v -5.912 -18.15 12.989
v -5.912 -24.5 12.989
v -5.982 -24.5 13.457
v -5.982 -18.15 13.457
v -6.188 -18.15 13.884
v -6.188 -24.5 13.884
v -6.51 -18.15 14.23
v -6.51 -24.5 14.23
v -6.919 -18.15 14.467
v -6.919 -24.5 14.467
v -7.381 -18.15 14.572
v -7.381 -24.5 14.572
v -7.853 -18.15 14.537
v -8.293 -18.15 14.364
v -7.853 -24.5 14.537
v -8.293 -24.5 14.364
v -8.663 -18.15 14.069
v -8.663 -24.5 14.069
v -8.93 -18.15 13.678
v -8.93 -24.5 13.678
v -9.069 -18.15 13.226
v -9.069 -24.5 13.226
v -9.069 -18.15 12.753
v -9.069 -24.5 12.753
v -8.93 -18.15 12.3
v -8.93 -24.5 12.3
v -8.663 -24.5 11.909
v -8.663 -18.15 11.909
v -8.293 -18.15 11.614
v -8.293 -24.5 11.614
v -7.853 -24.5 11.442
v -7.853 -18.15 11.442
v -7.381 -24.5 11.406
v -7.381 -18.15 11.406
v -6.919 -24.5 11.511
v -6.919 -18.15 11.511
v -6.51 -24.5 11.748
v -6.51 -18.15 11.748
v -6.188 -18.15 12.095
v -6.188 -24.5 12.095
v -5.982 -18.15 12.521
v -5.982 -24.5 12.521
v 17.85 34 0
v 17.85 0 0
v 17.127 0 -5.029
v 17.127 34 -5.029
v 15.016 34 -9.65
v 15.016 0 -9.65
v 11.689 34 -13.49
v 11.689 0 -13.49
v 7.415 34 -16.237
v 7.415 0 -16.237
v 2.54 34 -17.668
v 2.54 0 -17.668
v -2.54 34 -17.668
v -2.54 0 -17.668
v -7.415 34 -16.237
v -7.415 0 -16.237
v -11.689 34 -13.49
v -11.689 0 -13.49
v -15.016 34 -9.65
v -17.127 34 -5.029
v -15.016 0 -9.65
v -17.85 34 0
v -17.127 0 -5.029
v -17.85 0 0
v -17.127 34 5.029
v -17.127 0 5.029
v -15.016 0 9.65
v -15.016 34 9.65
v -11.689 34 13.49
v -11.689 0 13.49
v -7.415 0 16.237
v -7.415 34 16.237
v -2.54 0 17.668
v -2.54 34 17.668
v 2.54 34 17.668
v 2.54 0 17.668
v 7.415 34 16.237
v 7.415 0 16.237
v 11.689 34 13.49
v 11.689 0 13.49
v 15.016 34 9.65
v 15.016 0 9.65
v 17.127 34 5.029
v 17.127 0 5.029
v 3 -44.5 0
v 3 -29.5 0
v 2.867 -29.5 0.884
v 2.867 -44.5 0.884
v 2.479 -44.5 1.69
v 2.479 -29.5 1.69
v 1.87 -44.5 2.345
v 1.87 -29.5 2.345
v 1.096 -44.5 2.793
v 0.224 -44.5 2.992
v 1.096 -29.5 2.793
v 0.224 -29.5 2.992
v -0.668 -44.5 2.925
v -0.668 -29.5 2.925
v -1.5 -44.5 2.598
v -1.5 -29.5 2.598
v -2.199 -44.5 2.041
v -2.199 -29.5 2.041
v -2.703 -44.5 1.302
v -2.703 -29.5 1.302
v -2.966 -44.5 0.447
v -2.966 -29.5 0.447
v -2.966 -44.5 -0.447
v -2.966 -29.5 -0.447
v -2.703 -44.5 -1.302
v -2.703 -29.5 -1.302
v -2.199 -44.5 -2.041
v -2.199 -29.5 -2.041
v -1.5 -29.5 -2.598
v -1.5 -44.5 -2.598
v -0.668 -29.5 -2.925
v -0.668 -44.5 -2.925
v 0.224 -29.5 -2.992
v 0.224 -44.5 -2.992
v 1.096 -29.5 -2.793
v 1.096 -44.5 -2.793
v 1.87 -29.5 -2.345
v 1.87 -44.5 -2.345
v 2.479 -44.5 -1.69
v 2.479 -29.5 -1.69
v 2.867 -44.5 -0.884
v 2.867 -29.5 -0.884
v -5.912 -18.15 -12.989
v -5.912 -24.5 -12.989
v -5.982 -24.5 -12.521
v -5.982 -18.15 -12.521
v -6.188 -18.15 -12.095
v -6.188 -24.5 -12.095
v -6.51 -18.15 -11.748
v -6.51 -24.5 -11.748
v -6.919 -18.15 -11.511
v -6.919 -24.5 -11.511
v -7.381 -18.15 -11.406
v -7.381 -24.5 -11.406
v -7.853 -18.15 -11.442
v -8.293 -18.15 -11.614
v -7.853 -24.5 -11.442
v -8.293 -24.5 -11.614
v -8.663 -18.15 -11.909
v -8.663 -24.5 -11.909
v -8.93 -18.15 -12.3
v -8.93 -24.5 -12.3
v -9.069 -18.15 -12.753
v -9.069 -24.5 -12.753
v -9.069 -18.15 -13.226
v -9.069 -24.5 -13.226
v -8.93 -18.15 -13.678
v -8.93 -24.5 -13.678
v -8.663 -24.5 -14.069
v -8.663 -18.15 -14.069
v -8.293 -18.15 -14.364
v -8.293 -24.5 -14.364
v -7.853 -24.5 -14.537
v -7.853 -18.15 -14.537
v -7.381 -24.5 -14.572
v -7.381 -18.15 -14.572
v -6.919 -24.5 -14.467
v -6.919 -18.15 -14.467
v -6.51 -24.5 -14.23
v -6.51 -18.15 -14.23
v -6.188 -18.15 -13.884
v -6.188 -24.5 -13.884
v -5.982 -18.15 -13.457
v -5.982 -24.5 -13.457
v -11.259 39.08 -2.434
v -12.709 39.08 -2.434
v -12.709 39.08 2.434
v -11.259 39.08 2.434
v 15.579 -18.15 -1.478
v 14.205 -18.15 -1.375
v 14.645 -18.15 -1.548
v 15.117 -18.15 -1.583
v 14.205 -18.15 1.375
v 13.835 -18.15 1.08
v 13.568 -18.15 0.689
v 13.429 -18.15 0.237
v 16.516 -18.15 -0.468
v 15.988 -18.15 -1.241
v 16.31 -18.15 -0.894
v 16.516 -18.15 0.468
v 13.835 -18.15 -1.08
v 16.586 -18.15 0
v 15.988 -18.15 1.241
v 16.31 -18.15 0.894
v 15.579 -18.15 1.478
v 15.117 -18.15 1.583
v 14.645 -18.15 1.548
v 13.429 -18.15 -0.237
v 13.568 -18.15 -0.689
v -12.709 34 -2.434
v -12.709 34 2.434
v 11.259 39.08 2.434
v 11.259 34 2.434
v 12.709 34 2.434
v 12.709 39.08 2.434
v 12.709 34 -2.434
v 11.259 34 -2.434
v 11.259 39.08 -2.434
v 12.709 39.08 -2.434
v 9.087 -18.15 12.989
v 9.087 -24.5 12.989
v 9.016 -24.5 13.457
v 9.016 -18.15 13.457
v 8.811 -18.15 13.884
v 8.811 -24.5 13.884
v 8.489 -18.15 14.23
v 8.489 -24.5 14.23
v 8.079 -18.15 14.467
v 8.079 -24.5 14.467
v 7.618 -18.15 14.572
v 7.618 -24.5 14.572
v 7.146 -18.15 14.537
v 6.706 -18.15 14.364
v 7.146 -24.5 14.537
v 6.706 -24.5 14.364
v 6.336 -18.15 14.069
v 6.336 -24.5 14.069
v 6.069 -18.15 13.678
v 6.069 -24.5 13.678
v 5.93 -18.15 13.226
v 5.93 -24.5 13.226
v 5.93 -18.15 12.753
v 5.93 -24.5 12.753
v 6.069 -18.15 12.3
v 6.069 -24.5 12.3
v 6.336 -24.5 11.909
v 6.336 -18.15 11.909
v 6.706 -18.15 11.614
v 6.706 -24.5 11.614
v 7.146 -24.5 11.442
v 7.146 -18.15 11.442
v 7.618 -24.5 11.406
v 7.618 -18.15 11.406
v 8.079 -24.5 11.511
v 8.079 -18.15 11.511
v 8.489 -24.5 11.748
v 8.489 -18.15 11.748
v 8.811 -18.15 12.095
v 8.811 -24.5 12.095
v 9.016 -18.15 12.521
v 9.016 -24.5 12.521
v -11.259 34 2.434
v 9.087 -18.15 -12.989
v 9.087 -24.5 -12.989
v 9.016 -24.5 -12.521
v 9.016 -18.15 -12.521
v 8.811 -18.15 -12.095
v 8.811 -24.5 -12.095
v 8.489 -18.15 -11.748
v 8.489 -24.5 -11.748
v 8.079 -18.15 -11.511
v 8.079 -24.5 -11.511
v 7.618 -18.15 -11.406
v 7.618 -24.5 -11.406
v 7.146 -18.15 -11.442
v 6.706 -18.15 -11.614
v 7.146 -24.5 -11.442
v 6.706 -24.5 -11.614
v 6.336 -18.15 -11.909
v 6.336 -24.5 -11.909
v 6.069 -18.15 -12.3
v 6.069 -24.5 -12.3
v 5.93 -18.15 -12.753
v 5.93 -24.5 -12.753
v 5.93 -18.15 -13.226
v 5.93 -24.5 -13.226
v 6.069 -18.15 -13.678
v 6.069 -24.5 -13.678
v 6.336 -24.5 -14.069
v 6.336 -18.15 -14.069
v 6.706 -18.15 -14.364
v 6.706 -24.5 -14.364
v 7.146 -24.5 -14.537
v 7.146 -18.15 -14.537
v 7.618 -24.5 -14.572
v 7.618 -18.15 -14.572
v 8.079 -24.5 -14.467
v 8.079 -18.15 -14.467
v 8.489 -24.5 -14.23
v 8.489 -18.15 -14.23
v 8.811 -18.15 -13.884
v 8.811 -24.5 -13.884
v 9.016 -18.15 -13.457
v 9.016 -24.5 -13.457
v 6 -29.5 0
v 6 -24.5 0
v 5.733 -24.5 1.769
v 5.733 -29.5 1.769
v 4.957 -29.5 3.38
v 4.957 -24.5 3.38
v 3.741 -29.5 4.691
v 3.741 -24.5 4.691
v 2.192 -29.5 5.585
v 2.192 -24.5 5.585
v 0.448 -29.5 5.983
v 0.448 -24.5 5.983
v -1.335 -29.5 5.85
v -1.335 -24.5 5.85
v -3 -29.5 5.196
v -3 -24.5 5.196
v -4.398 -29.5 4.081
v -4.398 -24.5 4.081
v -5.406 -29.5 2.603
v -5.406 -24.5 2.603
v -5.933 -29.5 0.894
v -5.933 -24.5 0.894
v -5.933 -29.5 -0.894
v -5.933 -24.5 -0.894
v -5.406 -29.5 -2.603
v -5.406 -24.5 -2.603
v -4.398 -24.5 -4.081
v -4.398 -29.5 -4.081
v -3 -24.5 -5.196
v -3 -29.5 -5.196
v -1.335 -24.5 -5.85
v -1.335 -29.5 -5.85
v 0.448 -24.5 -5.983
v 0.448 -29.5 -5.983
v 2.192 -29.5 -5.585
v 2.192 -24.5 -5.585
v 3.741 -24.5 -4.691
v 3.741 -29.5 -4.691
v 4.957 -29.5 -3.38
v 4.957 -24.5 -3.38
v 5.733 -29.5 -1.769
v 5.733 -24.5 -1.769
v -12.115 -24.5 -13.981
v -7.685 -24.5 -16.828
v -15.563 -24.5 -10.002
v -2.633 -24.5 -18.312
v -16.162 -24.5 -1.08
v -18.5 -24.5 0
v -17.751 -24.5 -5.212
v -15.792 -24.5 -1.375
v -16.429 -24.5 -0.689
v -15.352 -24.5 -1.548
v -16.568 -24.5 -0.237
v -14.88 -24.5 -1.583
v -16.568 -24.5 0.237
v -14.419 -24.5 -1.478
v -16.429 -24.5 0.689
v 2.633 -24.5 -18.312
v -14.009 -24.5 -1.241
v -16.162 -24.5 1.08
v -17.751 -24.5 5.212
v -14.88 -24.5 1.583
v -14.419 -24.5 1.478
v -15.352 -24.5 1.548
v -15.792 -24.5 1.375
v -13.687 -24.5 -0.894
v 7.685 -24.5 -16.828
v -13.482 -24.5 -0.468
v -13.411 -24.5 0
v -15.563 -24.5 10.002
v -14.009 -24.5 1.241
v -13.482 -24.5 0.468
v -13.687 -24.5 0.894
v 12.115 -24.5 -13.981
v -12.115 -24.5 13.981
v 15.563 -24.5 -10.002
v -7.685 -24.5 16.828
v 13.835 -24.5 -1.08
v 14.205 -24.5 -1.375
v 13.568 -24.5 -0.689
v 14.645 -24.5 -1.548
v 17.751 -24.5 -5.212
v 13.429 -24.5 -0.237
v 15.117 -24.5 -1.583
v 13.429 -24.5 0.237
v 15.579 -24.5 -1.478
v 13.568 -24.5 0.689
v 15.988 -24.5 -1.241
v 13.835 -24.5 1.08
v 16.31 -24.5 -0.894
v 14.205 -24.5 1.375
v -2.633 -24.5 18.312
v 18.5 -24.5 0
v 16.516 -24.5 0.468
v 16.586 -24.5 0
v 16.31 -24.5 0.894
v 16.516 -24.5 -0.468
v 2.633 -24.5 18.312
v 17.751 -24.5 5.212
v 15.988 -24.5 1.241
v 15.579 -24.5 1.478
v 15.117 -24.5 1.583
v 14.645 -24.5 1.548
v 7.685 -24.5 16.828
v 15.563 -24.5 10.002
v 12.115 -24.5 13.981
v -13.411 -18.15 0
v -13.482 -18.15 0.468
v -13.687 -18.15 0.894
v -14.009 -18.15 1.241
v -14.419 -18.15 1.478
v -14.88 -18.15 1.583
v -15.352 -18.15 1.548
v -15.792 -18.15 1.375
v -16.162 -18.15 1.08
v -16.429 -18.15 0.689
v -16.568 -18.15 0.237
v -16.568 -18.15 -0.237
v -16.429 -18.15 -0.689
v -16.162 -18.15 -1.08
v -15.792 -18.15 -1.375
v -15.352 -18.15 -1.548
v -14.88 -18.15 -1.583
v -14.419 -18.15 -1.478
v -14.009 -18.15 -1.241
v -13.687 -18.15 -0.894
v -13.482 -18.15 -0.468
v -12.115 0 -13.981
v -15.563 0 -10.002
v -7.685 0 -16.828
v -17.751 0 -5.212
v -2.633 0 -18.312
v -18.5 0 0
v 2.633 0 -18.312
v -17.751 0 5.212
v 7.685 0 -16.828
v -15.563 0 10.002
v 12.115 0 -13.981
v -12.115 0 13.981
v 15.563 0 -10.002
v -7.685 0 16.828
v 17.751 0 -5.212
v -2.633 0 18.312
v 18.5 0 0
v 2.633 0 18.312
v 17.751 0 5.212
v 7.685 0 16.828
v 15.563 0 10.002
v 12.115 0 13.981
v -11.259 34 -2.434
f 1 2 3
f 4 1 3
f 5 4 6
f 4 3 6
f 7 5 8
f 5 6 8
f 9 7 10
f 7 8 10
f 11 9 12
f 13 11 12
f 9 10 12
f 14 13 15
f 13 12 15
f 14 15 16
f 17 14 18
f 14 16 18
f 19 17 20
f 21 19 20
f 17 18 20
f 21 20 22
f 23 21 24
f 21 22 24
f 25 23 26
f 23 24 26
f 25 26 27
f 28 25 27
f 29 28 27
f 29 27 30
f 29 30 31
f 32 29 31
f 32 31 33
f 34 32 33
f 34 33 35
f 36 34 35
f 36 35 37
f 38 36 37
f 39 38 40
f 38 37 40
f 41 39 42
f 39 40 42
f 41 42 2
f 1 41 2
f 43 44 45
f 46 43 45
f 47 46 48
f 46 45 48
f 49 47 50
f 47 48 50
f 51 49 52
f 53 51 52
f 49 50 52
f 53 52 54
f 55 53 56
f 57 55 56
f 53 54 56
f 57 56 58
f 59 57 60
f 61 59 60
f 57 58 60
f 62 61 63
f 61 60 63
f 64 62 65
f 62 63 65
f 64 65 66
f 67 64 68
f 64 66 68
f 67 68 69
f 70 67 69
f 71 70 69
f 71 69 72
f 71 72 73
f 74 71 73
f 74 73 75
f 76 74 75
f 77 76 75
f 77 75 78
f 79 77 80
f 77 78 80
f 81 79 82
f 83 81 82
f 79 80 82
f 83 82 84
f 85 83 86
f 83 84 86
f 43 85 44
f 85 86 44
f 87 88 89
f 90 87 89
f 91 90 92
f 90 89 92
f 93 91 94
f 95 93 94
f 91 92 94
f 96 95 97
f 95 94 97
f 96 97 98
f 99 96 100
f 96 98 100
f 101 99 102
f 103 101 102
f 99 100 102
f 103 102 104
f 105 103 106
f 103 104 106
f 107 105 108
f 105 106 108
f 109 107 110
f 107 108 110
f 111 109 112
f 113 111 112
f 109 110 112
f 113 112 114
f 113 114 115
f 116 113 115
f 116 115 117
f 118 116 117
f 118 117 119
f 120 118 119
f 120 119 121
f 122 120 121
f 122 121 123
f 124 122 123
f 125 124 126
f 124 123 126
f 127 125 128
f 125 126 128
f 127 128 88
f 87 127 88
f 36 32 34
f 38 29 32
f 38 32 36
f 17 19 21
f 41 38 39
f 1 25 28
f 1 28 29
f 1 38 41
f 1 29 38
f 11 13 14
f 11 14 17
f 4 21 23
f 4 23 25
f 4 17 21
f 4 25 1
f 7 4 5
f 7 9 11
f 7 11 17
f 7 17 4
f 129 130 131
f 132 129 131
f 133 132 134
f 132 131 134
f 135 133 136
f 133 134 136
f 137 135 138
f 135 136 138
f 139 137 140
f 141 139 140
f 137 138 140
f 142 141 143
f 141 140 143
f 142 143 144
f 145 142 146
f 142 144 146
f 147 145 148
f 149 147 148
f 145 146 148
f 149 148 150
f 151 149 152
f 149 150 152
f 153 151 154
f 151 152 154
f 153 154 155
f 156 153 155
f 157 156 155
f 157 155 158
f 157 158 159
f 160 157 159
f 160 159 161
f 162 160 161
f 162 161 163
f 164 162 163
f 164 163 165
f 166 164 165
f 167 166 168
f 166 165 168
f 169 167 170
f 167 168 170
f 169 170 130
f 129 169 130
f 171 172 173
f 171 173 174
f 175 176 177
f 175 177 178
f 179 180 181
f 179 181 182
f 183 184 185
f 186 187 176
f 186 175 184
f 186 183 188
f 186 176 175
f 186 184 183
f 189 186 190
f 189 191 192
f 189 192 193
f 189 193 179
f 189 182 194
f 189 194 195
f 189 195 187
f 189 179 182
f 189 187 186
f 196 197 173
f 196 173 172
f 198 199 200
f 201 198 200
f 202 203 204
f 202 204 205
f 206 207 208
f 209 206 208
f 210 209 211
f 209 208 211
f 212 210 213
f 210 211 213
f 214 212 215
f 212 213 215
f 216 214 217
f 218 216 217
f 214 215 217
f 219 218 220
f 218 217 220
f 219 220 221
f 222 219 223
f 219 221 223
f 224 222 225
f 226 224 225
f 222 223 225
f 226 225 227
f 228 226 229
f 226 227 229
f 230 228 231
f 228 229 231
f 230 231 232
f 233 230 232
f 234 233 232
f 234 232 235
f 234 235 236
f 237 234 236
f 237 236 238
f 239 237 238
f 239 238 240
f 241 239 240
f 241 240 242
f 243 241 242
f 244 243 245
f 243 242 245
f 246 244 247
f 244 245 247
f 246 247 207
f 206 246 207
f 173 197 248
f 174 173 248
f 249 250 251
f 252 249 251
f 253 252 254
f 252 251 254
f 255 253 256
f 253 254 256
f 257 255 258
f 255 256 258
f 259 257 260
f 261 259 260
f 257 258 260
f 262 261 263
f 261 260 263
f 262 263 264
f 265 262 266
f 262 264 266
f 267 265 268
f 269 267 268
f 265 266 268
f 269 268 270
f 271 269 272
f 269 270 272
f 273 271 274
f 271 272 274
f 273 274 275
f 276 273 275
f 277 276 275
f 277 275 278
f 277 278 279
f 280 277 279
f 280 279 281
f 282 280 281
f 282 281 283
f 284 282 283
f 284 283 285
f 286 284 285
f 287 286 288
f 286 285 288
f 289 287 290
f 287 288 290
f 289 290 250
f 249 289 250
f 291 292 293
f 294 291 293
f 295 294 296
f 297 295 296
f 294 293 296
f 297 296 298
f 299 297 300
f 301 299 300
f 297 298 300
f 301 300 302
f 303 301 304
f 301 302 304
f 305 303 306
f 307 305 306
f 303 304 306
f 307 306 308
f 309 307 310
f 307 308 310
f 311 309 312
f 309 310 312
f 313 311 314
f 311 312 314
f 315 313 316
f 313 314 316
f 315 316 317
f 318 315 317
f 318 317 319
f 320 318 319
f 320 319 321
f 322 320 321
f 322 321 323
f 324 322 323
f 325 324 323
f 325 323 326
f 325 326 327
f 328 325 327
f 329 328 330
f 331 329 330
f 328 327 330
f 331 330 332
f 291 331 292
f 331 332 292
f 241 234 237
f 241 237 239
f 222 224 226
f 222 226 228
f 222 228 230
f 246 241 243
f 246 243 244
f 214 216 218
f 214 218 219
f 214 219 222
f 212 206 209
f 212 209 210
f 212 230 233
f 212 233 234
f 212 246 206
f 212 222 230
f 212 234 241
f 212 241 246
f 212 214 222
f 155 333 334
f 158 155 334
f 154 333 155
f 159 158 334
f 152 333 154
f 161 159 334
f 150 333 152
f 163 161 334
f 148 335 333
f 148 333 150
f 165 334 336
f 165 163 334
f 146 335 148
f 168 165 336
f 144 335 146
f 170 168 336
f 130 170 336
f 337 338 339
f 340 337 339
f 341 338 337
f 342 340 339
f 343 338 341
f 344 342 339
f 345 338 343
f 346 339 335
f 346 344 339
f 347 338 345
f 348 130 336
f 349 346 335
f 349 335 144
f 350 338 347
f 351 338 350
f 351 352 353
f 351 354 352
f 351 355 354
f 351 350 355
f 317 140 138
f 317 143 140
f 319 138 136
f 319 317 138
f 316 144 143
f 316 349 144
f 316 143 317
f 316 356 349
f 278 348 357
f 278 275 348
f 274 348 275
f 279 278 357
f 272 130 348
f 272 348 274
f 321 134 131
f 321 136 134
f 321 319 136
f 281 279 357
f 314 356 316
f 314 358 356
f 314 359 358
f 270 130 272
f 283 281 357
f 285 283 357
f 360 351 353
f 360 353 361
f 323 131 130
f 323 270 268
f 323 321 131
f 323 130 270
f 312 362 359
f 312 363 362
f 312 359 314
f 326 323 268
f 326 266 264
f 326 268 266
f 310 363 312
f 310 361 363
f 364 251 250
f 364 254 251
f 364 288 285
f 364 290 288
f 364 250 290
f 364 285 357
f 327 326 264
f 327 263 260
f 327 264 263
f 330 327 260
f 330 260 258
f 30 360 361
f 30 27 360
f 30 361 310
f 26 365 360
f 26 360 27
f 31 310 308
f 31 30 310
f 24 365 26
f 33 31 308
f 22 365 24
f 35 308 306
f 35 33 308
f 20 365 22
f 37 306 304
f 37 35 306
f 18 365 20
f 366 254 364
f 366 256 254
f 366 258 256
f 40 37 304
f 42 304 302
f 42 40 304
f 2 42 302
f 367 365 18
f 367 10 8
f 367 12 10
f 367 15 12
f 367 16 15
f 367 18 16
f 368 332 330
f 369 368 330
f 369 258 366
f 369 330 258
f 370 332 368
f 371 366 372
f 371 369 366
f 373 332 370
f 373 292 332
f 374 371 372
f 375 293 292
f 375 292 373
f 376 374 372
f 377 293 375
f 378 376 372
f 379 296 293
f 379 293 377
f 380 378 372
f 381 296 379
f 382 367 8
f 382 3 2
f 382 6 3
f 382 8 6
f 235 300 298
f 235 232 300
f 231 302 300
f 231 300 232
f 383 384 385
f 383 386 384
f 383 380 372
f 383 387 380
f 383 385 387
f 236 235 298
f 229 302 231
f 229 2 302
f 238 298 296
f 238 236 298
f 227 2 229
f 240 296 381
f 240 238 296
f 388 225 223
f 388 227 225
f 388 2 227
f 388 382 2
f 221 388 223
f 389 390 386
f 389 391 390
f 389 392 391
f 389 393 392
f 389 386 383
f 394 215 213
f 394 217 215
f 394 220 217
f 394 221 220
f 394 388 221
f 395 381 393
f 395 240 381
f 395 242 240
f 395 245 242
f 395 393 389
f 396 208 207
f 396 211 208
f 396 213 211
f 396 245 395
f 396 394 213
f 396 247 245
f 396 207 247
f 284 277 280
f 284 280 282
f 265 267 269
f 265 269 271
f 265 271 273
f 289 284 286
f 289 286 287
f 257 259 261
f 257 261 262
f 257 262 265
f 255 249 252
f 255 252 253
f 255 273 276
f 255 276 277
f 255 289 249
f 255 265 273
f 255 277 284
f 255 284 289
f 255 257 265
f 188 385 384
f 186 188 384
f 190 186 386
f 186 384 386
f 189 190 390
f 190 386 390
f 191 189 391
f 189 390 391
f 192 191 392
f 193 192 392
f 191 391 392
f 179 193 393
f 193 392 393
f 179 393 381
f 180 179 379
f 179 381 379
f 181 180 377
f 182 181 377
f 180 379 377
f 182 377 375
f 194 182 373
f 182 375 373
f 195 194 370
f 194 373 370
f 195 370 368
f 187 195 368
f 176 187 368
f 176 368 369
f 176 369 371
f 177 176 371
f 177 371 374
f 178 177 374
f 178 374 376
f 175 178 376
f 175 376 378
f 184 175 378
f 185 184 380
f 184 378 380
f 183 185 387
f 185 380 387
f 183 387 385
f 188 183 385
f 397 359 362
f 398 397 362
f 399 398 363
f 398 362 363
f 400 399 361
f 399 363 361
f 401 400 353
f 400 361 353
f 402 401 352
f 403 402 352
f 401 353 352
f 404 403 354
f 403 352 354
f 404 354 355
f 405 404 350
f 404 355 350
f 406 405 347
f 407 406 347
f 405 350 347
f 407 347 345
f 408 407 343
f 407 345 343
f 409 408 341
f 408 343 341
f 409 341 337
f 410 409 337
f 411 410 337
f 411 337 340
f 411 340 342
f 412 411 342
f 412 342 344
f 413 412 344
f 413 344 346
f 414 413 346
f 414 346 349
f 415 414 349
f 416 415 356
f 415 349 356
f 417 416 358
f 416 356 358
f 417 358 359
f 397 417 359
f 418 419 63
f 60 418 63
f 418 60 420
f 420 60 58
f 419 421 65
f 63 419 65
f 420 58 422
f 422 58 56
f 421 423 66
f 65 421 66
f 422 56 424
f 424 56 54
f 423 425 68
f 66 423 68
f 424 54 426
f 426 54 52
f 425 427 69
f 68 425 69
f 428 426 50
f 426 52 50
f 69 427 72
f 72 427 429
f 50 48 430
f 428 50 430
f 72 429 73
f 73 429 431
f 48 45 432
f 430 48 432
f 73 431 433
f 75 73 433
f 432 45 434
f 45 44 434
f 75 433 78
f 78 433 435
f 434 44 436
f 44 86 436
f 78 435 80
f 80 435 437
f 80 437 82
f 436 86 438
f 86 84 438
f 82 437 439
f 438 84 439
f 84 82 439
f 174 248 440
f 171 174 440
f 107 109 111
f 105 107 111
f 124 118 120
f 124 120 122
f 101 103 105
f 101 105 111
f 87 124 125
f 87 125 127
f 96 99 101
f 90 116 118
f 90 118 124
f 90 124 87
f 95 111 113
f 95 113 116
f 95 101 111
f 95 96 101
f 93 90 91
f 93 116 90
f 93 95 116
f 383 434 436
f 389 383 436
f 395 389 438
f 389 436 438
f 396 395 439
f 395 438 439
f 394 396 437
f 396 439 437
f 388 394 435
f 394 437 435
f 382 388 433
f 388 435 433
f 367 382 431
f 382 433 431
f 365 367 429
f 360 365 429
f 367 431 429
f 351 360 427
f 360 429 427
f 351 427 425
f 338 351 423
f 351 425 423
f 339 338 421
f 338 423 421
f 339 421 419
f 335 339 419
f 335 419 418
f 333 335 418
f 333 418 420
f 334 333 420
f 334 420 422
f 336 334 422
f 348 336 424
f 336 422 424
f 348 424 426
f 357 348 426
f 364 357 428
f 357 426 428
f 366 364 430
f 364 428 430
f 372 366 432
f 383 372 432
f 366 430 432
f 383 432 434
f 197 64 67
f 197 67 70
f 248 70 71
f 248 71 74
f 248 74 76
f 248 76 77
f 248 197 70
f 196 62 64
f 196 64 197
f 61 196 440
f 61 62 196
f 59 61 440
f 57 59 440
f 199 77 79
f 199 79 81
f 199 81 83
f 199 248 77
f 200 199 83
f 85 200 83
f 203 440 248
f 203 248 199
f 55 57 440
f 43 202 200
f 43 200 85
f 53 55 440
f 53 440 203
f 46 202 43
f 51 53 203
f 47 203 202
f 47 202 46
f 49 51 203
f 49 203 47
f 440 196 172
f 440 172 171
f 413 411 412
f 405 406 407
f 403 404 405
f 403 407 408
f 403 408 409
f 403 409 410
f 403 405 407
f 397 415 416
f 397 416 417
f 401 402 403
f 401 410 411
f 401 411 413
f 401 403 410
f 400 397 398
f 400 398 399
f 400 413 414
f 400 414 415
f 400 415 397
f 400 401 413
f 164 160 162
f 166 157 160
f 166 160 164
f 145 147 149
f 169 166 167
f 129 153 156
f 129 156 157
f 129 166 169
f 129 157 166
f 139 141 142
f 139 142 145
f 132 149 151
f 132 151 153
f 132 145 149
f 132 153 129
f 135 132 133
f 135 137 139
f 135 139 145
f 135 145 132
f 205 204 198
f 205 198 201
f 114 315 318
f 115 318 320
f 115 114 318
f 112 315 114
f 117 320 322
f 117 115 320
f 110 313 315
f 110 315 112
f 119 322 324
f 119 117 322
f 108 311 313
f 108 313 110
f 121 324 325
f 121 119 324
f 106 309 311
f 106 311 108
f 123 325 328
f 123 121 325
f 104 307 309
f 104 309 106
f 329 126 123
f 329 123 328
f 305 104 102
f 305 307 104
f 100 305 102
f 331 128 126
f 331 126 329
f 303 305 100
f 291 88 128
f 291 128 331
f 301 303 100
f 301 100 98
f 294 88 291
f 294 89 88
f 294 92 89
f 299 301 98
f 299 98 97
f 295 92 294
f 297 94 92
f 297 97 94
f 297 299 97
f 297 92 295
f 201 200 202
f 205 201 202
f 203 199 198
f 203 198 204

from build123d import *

# Parameters (mm, degrees)
SKETCH_R     = 18.5
PAD_DEPTH    = 24.5
SKETCH001_R  = 6
PAD001_DEPTH = 5
SKETCH002_R  = 3
PAD002_DEPTH = 15
SKETCH003_R  = 17.85
PAD003_DEPTH = 34
SKETCH004_W  = 1.450325
SKETCH004_H  = 4.868494
PAD004_DEPTH = 5.08
SKETCH005_R  = 1.5875
POCKET_DEPTH = 6.35


with BuildPart() as part:
    # Sketch → Pad (new body)
    with BuildSketch(Plane.XZ):
        Circle(SKETCH_R)
    extrude(amount=PAD_DEPTH)

    # Sketch001 (on Face3 of Pad) → Pad001 (join)
    with BuildSketch(Plane.XZ.offset(24.5)):
        Circle(SKETCH001_R)
    extrude(amount=PAD001_DEPTH)

    # Sketch002 (on Face5 of Pad001) → Pad002 (join)
    with BuildSketch(Plane.XZ.offset(29.5)):
        Circle(SKETCH002_R)
    extrude(amount=PAD002_DEPTH)

    # Sketch003 (on Face2 of Pad002) → Pad003 (join)
    with BuildSketch(Plane(origin=(0, 0, 0), x_dir=(1, 0, 0), z_dir=(0, 1, 0))):
        Circle(SKETCH003_R)
    extrude(amount=PAD003_DEPTH)

    # Sketch004 (on Face6 of Pad003) → Pad004 (join)
    with BuildSketch(Plane(origin=(0, 34, 0), x_dir=(1, 0, 0), z_dir=(0, 1, 0))):
        with Locations((-11.984146, 0)):
            Rectangle(SKETCH004_W, SKETCH004_H)
        with Locations((11.984146, 0)):
            Rectangle(SKETCH004_W, SKETCH004_H)
    extrude(amount=PAD004_DEPTH)

    # Sketch005 (on Face3 of Pad004) → Pocket (cut)
    with BuildSketch(Plane.XZ.offset(24.5)):
        with Locations((-7.49935, 12.989255)):
            Circle(SKETCH005_R)
        with Locations((-14.9987, 0)):
            Circle(SKETCH005_R)
        with Locations((-7.49935, -12.989255)):
            Circle(SKETCH005_R)
        with Locations((7.49935, -12.989255)):
            Circle(SKETCH005_R)
        with Locations((14.9987, 0)):
            Circle(SKETCH005_R)
        with Locations((7.49935, 12.989255)):
            Circle(SKETCH005_R)
    extrude(amount=-POCKET_DEPTH, mode=Mode.SUBTRACT)


solid = part.part
